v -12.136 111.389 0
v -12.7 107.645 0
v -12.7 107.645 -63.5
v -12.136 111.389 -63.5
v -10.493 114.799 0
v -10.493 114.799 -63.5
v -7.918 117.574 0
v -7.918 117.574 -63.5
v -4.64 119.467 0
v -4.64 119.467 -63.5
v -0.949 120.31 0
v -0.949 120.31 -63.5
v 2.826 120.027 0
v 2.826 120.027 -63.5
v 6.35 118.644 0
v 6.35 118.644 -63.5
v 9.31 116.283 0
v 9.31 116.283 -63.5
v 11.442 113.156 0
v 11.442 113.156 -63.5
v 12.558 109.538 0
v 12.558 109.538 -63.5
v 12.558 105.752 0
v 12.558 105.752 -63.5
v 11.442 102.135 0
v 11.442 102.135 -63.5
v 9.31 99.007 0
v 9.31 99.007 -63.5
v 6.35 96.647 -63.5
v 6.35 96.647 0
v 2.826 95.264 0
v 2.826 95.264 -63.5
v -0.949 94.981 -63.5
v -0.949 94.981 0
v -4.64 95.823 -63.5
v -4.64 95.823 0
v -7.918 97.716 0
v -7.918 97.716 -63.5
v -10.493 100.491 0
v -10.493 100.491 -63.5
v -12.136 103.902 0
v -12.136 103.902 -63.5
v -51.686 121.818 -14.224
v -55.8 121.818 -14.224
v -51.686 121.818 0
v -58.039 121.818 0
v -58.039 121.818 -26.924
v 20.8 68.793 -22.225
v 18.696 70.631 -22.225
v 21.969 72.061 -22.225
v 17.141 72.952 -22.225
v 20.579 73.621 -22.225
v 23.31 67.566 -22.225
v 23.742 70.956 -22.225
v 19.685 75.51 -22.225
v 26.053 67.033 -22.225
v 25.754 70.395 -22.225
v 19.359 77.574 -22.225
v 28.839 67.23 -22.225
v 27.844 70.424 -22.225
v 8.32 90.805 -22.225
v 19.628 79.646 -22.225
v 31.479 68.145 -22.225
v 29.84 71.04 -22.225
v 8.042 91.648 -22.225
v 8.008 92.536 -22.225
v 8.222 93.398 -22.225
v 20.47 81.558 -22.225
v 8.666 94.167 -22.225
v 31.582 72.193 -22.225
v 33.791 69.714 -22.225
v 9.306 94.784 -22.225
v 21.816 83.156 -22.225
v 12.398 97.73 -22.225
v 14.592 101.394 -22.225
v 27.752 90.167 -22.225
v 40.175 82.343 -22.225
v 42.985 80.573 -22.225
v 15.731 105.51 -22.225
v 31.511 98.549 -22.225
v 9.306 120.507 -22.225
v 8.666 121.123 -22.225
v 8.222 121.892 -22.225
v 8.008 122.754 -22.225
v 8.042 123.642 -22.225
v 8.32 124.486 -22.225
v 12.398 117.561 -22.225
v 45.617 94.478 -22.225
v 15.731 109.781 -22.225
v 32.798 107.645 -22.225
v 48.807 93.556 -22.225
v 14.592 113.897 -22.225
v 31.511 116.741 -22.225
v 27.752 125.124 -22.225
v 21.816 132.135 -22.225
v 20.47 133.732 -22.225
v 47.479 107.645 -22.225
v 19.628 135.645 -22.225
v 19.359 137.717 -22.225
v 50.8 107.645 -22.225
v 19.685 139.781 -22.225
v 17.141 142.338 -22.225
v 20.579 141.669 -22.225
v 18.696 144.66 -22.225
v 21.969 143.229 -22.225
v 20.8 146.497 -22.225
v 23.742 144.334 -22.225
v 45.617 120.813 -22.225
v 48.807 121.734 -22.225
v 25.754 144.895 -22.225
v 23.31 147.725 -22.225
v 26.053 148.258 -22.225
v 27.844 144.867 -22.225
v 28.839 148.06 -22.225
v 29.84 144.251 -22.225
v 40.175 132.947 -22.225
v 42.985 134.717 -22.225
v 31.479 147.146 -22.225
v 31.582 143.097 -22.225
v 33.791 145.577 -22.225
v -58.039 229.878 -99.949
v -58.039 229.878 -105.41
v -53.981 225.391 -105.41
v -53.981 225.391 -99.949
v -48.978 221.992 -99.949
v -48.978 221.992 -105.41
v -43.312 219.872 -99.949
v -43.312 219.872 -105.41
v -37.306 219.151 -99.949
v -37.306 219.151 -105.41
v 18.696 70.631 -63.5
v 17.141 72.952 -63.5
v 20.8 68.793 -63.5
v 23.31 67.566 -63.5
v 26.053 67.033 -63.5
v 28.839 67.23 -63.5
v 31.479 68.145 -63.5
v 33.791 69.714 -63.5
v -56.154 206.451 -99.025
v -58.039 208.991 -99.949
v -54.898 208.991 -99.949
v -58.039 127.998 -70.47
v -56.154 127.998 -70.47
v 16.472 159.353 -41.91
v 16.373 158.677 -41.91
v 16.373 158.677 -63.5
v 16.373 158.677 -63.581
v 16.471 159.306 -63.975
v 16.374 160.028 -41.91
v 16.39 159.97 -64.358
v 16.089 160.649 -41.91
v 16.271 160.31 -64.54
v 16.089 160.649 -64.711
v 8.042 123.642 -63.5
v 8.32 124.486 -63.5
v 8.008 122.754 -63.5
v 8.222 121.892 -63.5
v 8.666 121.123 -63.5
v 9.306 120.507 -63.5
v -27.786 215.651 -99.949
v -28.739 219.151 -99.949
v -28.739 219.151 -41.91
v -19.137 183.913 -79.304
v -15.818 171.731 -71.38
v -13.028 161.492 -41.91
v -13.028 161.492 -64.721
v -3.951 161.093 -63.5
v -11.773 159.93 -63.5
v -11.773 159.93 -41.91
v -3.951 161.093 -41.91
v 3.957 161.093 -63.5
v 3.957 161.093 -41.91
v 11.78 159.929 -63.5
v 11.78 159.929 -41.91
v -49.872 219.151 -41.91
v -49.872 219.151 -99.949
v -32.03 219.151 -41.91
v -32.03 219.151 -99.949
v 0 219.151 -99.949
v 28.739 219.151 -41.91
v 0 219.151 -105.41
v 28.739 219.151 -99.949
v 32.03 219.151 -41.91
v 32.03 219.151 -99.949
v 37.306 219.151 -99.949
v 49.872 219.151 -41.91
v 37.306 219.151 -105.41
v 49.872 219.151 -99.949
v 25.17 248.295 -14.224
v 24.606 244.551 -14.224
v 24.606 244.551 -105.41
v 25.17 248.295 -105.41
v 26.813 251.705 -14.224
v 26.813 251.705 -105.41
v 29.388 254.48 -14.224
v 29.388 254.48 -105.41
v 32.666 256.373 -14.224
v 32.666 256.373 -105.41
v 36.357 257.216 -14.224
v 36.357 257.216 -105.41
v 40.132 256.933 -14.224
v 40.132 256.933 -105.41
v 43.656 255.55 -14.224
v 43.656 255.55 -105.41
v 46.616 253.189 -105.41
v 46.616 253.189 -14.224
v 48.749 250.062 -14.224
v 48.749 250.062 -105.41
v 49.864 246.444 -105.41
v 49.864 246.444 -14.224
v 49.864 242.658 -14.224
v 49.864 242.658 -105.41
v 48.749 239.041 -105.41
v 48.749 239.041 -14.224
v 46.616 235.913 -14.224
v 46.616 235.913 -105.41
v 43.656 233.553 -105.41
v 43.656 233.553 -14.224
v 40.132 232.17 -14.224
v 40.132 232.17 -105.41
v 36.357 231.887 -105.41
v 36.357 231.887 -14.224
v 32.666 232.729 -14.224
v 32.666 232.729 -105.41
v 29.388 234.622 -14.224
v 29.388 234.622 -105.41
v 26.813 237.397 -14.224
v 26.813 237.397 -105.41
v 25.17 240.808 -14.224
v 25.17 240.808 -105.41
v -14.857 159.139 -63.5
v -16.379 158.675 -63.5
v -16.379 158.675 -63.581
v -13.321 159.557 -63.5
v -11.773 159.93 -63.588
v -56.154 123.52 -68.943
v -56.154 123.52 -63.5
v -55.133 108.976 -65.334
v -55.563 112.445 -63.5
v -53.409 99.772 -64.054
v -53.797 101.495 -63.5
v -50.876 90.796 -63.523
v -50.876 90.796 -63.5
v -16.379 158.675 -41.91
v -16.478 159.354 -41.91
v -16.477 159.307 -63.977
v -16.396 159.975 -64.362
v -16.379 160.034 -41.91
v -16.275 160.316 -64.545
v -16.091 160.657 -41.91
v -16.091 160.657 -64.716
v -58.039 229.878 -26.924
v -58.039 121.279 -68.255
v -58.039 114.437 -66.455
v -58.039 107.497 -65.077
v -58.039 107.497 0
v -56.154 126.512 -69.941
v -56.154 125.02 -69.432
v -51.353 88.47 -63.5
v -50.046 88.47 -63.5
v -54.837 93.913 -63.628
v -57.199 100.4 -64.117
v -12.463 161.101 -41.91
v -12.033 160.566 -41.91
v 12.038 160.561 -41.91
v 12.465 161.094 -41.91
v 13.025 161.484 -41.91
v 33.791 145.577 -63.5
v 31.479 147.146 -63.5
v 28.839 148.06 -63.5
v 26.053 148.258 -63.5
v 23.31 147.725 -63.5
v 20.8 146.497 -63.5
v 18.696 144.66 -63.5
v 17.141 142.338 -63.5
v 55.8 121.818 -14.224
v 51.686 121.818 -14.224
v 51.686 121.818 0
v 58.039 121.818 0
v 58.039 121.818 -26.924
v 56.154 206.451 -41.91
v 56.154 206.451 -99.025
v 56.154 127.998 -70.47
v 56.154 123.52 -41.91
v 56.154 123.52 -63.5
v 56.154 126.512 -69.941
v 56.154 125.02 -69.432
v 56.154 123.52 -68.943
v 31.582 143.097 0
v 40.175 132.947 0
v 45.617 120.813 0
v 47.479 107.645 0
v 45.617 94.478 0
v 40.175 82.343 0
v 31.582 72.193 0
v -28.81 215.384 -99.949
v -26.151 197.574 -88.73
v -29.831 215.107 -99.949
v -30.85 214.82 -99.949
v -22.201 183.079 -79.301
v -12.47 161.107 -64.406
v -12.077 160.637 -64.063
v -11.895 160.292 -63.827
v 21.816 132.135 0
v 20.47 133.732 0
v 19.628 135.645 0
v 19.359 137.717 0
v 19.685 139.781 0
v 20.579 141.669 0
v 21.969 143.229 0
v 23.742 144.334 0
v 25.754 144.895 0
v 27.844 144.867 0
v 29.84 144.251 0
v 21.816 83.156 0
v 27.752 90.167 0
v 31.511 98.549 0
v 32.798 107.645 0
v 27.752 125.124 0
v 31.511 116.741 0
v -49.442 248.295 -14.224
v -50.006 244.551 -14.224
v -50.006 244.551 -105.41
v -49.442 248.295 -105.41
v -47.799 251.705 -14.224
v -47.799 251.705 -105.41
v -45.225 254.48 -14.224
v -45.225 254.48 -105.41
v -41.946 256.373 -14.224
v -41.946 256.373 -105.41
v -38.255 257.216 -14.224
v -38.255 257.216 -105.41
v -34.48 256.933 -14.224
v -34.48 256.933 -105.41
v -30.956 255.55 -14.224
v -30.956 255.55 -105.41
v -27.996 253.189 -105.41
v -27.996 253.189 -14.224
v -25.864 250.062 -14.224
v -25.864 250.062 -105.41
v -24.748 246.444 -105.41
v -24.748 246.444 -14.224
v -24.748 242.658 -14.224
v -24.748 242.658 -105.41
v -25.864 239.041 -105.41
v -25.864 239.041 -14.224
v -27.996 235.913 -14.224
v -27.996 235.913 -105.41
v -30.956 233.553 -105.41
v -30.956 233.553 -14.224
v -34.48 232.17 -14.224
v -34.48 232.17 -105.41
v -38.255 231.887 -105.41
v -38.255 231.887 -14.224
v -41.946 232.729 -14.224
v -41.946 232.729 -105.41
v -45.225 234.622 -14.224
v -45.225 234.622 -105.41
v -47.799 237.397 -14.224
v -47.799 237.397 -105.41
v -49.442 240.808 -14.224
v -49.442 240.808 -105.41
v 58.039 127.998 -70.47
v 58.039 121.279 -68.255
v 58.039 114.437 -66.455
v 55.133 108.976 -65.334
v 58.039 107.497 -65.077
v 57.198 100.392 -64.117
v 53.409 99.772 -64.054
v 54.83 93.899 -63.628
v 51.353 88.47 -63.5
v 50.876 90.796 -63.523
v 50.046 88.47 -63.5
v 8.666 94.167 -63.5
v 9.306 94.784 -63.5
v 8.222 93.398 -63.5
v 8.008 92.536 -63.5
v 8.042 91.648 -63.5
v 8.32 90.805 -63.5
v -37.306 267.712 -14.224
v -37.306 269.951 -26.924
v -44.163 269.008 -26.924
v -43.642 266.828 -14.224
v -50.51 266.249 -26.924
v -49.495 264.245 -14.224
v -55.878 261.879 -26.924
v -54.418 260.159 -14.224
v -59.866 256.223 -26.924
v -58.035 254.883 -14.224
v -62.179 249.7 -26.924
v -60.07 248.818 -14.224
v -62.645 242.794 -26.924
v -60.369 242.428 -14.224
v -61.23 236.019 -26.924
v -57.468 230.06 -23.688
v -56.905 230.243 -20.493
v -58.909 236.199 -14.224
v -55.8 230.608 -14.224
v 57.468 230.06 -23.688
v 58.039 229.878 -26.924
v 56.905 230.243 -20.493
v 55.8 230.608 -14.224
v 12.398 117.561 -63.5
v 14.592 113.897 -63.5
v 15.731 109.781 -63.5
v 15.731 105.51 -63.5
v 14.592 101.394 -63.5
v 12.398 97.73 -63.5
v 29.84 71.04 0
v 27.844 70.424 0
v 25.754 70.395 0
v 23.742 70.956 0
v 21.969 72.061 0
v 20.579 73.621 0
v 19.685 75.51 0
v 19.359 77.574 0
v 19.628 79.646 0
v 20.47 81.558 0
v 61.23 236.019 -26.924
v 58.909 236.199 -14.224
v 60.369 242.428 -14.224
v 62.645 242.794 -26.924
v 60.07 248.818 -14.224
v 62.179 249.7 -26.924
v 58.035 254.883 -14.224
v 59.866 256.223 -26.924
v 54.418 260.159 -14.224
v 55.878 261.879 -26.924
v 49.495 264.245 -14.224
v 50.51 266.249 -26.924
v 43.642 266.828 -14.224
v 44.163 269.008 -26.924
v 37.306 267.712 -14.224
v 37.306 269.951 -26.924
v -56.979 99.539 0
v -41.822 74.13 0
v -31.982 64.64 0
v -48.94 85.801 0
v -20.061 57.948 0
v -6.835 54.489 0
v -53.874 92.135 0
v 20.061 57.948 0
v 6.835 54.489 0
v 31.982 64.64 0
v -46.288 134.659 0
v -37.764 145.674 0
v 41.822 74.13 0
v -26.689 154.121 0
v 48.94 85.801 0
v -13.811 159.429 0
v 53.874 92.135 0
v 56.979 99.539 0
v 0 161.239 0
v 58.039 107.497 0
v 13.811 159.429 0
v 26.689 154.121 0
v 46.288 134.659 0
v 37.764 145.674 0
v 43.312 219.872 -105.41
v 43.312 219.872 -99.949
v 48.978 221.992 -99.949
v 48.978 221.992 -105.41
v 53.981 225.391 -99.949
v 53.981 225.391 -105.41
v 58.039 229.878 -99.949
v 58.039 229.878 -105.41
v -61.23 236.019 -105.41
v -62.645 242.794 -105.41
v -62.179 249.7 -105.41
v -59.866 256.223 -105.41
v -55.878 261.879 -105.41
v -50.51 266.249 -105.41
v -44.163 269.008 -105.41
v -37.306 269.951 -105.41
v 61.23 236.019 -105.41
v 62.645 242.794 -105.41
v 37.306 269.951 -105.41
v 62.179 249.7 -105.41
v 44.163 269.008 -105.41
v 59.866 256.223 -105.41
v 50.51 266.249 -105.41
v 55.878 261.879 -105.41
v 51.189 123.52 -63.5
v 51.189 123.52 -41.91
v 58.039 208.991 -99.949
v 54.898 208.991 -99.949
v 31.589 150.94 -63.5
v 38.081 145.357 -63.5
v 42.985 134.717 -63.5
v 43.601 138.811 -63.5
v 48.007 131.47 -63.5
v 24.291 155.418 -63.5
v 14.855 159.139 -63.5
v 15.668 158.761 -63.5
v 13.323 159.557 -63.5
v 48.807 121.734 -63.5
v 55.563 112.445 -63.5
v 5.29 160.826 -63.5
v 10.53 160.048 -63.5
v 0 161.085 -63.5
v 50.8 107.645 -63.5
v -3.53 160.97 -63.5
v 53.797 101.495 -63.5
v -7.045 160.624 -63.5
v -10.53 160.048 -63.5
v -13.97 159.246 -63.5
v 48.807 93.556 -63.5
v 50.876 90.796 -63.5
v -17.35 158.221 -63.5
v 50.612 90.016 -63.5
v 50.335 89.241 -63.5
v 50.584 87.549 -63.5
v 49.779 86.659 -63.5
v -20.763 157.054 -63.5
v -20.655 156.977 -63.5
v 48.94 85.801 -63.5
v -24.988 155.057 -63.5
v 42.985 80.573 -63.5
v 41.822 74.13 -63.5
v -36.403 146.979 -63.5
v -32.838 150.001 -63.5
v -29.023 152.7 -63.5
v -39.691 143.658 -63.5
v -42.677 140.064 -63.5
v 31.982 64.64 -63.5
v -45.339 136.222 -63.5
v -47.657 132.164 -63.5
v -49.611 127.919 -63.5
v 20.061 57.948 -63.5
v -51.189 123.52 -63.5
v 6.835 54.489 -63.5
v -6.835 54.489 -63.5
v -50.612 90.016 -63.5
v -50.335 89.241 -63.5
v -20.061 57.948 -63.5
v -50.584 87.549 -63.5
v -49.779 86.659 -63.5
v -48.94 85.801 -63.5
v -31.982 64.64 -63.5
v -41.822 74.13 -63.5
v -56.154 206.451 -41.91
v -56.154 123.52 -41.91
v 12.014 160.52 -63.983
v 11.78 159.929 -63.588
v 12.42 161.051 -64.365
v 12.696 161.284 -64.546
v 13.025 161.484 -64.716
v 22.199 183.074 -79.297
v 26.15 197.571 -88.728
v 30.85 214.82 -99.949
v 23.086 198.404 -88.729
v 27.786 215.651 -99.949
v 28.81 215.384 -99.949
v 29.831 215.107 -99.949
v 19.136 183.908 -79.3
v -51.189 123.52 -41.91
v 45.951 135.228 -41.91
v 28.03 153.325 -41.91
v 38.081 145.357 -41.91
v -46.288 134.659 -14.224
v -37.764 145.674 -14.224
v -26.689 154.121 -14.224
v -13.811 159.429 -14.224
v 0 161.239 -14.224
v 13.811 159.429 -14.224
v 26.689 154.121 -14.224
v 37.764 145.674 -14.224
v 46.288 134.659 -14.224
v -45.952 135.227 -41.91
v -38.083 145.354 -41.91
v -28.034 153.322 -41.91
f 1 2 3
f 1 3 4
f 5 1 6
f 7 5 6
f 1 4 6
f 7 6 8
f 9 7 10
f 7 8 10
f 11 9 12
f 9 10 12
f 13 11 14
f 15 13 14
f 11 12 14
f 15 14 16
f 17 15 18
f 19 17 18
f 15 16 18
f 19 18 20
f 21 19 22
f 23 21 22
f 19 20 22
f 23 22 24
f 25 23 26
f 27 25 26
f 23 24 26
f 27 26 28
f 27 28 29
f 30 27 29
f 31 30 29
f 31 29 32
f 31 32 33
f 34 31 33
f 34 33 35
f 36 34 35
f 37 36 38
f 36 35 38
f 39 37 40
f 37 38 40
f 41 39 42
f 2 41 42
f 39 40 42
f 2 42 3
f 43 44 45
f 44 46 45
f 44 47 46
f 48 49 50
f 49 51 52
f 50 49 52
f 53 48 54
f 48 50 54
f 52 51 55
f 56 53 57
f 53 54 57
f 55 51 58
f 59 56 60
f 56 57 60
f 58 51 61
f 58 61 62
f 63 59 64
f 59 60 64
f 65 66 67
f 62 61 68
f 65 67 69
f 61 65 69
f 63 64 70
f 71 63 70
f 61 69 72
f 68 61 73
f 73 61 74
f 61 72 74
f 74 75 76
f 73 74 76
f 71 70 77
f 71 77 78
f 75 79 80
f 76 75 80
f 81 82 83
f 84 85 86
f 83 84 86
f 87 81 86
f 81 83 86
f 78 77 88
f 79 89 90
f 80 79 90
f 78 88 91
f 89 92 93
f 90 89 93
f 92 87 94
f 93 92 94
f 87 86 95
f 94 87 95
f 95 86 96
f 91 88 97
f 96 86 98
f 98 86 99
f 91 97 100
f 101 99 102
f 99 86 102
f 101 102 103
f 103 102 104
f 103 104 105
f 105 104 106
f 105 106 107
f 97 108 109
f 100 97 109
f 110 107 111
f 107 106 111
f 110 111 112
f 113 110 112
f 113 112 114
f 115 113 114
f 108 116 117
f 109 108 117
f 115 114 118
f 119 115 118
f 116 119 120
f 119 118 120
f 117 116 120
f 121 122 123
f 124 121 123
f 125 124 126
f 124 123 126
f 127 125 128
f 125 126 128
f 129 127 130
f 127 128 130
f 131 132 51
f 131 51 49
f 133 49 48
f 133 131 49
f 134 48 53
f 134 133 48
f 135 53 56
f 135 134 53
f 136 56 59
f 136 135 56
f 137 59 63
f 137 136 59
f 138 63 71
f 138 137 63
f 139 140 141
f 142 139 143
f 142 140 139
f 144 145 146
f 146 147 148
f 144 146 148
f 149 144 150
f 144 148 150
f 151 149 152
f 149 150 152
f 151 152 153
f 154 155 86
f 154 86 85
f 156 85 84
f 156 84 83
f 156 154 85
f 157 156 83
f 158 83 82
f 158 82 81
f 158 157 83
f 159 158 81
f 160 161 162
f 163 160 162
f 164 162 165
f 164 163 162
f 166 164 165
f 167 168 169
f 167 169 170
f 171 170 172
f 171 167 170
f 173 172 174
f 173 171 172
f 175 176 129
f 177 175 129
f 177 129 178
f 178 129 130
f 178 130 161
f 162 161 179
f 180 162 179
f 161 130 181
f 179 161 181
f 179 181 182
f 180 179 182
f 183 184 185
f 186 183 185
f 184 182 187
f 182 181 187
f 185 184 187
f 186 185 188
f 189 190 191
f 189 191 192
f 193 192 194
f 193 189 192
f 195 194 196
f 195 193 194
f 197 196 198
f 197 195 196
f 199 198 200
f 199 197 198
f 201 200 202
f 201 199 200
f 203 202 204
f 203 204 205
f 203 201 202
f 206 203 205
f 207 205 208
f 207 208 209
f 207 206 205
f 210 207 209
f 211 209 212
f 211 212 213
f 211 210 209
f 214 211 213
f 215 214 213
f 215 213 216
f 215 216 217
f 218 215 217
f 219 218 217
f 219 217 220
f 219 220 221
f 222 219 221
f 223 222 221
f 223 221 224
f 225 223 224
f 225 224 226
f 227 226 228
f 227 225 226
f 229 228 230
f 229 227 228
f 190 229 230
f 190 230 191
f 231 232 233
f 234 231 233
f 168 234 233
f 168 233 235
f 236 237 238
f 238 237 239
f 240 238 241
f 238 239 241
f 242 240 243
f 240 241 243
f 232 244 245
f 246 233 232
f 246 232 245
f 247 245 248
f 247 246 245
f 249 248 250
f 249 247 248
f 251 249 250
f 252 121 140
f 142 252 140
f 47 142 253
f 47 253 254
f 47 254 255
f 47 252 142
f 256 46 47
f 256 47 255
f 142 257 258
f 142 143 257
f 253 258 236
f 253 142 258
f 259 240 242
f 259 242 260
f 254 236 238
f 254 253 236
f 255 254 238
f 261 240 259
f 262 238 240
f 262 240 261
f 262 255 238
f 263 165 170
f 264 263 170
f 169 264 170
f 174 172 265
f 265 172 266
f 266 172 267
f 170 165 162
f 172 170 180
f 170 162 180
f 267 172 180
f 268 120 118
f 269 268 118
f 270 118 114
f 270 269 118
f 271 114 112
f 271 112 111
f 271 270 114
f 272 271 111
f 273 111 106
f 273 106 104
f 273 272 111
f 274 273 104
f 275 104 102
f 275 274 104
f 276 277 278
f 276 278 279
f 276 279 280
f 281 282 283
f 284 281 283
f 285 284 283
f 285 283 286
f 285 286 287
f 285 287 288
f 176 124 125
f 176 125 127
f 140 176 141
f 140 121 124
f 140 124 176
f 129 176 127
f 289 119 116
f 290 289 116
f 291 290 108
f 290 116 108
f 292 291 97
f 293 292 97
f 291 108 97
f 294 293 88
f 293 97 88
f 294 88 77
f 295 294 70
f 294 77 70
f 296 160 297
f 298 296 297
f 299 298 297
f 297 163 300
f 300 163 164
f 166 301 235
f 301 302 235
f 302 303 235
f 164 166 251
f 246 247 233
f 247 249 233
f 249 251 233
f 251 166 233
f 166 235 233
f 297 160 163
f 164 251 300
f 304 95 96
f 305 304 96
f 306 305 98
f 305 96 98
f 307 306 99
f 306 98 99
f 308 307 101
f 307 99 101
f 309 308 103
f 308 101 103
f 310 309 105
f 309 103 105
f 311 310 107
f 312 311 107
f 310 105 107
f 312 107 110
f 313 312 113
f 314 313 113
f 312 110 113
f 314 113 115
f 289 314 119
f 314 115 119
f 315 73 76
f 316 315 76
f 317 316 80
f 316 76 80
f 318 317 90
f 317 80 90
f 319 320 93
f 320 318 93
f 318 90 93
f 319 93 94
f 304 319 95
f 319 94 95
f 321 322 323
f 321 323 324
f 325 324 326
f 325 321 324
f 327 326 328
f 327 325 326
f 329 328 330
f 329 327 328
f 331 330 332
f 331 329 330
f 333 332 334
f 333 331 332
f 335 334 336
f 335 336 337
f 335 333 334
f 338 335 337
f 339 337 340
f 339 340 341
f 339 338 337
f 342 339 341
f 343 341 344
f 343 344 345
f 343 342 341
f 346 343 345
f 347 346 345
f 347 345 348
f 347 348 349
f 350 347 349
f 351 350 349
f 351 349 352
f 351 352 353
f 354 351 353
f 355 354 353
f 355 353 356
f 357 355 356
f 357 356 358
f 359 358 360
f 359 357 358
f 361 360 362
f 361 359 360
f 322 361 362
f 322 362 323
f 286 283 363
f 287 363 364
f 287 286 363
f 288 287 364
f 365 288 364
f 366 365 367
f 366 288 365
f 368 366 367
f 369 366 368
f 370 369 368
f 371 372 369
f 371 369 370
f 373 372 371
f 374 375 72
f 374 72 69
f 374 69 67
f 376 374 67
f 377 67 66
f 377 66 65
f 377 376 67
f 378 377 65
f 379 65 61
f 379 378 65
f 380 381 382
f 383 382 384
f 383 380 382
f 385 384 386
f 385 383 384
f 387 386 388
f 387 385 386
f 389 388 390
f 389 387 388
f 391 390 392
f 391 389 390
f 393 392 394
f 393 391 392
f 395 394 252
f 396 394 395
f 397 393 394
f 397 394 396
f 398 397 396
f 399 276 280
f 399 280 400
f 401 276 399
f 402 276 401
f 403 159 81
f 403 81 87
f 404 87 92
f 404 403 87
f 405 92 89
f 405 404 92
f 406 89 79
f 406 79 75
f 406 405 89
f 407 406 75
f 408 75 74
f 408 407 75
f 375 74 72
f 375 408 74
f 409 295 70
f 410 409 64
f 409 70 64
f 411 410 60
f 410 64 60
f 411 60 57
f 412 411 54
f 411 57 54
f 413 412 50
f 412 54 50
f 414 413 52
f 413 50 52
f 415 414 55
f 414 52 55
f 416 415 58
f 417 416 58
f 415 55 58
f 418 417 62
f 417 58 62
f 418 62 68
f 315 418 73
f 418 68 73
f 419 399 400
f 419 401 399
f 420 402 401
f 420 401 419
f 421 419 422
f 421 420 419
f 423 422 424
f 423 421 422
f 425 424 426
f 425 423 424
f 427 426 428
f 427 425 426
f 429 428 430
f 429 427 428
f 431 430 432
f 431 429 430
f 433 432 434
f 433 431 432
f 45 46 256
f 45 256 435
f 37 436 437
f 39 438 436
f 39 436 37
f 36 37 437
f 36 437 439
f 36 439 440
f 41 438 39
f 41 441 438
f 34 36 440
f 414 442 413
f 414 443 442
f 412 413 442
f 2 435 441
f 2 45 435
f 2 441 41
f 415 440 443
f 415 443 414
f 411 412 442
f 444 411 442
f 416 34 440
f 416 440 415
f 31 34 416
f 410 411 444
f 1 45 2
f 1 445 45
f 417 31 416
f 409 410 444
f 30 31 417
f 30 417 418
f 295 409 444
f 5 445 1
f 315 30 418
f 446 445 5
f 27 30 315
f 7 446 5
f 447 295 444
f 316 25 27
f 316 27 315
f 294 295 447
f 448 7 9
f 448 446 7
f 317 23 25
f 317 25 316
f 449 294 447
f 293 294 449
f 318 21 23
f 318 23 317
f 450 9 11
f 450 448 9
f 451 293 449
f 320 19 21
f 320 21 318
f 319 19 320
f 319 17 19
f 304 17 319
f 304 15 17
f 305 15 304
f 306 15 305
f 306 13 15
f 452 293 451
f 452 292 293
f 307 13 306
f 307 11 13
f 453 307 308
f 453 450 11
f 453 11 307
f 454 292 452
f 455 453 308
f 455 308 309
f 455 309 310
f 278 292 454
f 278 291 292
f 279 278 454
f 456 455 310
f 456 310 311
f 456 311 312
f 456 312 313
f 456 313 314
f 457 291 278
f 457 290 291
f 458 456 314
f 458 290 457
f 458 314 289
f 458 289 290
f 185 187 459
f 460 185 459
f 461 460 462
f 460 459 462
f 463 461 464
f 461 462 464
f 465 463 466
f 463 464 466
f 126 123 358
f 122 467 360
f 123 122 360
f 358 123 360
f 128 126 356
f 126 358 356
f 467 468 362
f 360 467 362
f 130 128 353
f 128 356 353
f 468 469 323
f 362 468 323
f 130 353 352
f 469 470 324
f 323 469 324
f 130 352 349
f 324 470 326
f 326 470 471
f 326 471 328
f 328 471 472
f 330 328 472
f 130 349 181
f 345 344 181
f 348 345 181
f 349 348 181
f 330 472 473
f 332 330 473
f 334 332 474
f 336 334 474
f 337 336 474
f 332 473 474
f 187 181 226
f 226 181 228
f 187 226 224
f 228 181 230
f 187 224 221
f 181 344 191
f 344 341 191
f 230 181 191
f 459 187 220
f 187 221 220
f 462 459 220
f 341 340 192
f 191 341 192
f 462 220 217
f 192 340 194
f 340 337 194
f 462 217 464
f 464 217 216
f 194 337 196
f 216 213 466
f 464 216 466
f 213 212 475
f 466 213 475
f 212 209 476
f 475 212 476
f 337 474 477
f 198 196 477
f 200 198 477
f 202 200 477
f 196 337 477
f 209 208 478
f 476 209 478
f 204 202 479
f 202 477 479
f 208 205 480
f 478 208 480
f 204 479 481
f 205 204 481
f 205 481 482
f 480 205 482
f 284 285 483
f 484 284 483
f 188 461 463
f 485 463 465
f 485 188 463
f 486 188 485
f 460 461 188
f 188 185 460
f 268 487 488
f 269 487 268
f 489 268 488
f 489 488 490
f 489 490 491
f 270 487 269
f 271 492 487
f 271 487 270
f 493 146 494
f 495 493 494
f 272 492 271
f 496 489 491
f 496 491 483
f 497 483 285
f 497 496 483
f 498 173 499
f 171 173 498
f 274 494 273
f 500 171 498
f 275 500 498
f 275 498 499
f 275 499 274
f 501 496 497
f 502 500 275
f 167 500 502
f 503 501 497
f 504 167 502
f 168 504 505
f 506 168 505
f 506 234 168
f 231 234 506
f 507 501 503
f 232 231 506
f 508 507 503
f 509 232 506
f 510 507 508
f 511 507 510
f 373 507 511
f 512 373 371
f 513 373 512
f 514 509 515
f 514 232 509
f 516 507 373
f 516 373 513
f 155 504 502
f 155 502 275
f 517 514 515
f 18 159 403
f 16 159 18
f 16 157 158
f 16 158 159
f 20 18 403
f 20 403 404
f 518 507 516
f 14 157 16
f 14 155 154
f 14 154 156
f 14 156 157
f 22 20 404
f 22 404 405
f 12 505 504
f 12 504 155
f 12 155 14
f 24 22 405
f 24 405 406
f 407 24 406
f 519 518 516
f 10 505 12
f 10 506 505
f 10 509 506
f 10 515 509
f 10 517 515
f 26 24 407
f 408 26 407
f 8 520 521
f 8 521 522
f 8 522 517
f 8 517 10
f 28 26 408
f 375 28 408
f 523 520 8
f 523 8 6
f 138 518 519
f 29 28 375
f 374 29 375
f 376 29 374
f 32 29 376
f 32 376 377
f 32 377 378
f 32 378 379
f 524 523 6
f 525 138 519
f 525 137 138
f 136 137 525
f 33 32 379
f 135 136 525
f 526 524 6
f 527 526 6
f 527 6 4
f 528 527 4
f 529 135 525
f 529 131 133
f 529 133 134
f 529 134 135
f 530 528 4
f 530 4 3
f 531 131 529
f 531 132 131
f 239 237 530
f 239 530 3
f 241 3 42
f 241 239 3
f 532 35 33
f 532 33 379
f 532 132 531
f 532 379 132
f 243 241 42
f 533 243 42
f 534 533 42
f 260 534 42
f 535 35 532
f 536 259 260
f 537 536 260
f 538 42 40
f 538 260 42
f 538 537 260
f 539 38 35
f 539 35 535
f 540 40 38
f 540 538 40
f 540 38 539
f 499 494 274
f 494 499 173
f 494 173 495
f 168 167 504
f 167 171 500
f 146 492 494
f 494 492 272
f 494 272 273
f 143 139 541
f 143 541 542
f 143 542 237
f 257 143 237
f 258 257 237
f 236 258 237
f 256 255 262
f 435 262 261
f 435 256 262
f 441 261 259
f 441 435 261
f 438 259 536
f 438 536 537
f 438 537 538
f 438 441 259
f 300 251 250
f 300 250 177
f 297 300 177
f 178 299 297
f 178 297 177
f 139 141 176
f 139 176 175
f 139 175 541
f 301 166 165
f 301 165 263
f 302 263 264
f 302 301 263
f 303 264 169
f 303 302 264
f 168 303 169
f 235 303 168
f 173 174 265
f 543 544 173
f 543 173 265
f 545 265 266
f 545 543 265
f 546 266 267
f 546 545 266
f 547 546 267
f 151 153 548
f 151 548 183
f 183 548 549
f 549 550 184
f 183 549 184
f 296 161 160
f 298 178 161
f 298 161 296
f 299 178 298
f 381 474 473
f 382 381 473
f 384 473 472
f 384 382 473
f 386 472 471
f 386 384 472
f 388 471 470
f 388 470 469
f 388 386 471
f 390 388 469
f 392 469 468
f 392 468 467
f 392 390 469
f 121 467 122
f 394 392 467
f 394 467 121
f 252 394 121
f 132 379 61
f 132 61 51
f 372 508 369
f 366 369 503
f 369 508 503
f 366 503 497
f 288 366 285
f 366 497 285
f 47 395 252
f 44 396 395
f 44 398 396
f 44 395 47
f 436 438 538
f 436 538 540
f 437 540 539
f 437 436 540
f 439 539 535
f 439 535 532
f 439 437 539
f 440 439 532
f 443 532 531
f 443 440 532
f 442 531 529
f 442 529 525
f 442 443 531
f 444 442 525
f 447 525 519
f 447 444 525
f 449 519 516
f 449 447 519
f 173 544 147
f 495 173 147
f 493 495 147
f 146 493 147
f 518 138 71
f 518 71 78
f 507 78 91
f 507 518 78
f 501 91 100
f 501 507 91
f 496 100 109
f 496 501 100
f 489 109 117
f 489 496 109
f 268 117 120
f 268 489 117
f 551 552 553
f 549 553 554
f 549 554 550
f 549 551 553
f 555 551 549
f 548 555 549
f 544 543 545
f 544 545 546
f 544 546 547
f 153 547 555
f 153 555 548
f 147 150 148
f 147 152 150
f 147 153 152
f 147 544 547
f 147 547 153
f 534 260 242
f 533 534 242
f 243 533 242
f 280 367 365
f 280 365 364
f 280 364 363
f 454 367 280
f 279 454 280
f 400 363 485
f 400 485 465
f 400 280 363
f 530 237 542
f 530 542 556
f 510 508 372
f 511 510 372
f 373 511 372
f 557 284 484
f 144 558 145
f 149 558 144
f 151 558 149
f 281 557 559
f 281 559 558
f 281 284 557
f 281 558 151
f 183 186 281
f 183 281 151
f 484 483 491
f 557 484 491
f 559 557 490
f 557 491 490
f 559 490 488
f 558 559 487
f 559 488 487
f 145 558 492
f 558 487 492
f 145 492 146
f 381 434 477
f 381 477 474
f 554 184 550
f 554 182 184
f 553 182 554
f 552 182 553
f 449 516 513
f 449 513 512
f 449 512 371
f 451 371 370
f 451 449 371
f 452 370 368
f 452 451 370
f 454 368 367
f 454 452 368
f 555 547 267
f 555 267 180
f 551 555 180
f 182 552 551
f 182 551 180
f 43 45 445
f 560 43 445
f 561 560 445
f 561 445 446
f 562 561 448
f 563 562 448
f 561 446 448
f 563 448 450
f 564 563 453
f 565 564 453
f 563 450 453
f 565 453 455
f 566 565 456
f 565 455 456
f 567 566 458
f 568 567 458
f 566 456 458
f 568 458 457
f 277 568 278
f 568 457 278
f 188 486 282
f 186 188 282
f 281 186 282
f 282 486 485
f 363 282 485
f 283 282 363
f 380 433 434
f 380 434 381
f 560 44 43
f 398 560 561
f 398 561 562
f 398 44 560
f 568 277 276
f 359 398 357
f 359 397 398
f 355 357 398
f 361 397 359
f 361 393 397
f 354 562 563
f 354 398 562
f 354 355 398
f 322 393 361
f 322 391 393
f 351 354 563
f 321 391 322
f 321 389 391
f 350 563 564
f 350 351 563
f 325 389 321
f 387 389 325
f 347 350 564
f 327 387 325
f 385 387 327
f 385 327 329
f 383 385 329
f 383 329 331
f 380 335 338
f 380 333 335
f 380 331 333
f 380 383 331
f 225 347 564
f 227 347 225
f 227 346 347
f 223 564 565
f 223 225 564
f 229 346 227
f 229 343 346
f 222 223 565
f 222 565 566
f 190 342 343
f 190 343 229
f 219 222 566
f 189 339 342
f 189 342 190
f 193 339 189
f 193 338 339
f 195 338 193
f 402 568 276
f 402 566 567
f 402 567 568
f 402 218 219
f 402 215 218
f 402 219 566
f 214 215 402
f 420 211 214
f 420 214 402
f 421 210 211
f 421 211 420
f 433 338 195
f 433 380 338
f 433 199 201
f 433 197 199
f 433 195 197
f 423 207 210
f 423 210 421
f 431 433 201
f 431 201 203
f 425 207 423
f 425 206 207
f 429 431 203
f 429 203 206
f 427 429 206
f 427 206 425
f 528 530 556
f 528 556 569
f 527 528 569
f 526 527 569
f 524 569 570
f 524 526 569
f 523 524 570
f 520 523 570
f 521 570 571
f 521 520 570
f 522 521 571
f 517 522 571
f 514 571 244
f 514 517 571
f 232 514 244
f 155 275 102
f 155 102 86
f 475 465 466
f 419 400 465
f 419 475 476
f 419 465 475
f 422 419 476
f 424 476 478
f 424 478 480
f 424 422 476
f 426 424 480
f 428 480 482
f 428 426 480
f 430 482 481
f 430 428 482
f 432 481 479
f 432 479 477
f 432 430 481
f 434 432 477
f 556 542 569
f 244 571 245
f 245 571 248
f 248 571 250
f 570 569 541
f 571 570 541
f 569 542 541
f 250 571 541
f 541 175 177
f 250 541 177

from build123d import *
from OCP.BRepFilletAPI import BRepFilletAPI_MakeChamfer

# Parameters (mm, degrees)
SKETCH39_R               = 12.7
BOSS_EXTRUDE16_DEPTH     = 105.41
CUT_EXTRUDE13_DEPTH      = 297.507996976
CUT_EXTRUDE13_DEPTH_BACK = 297.507996976
SKETCH41_R               = 12.7
BOSS_EXTRUDE17_DEPTH     = 5.461
SKETCH42_R               = 53.594
CUT_EXTRUDE14_DEPTH      = 41.91
SKETCH43_R               = 12.7
CUT_EXTRUDE15_DEPTH      = 41.275
CUT_EXTRUDE25_DEPTH      = 14.224
CHAMFER1_SIZE            = 12.7
CHAMFER1_SIZE2           = 2.239352655
CUT_EXTRUDE18_DEPTH      = 63.5
CUT_REVOLVE4_ANGLE       = 45
CUT_EXTRUDE22_REACH      = 286.32
SKETCH53_R               = 12.7
CUT_EXTRUDE23_DEPTH      = 285.32019658
CUT_EXTRUDE24_DEPTH      = 290.353535308


with BuildPart() as part:
    # Sketch39 → Boss-Extrude16 (new body)
    with BuildSketch(Plane(origin=(0, 0, 0), x_dir=(-1, 0, 0), z_dir=(0, 0, -1))):
        with BuildLine():
            Line((-37.30625, 269.9512), (37.30625, 269.9512))
            ThreePointArc((37.30625, 269.9512), (59.865817558, 256.222785651), (58.039, 229.877649733))
            Line((58.039, 229.877649733), (58.039, 107.49735517))
            ThreePointArc((58.039, 107.49735517), (55.67225609, 95.733970947), (48.940336125, 85.8012))
            ThreePointArc((48.940336125, 85.8012), (0, 54.0512), (-48.940336125, 85.8012))
            ThreePointArc((-48.940336125, 85.8012), (-55.67225609, 95.733970947), (-58.039, 107.49735517))
            Line((-58.039, 107.49735517), (-58.039, 229.877649733))
            ThreePointArc((-58.039, 229.877649733), (-59.865817558, 256.222785651), (-37.30625, 269.9512))
        make_face()
        with Locations((-37.30625, 244.5512)):
            Circle(SKETCH39_R, mode=Mode.SUBTRACT)
        with Locations((37.30625, 244.5512)):
            Circle(SKETCH39_R, mode=Mode.SUBTRACT)
    extrude(amount=BOSS_EXTRUDE16_DEPTH)

    # Sketch40 → Cut-Extrude13 (cut, two sides)
    with BuildSketch(Plane(origin=(0, 0, 0), x_dir=(0, 0, -1), z_dir=(1, 0, 0))) as cut_extrude13_sk:
        with BuildLine():
            Line((99.949, 208.9912), (70.469723816, 127.997554342))
            ThreePointArc((70.469723816, 127.997554342), (65.255767984, 108.538806271), (63.5, 88.470286378))
            Line((63.5, 88.470286378), (63.5, 54.0512))
            Line((63.5, 54.0512), (105.41, 54.0512))
            Line((105.41, 54.0512), (105.41, 229.877649733))
            Line((105.41, 229.877649733), (99.949, 229.877649733))
            Line((99.949, 229.877649733), (99.949, 208.9912))
        make_face()
    extrude(amount=CUT_EXTRUDE13_DEPTH, mode=Mode.SUBTRACT)
    extrude(cut_extrude13_sk.sketch, amount=-CUT_EXTRUDE13_DEPTH_BACK, mode=Mode.SUBTRACT)

    # Sketch41 → Boss-Extrude17 (add)
    with BuildSketch(Plane(origin=(0, 0, -105.41), x_dir=(-1, 0, 0), z_dir=(0, 0, -1))):
        with BuildLine():
            Line((-37.30625, 269.9512), (37.30625, 269.9512))
            ThreePointArc((37.30625, 269.9512), (62.70625, 244.5512), (37.30625, 219.1512))
            Line((37.30625, 219.1512), (-37.30625, 219.1512))
            ThreePointArc((-37.30625, 219.1512), (-62.70625, 244.5512), (-37.30625, 269.9512))
        make_face()
        with Locations((-37.30625, 244.5512)):
            Circle(SKETCH41_R, mode=Mode.SUBTRACT)
        with Locations((37.30625, 244.5512)):
            Circle(SKETCH41_R, mode=Mode.SUBTRACT)
    extrude(amount=-BOSS_EXTRUDE17_DEPTH)

    # Sketch42 → Cut-Extrude14 (cut)
    with BuildSketch(Plane(origin=(0, 0, -105.41), x_dir=(-1, 0, 0), z_dir=(0, 0, -1))):
        with Locations((0, 107.6452)):
            Circle(SKETCH42_R)
    extrude(amount=-CUT_EXTRUDE14_DEPTH, mode=Mode.SUBTRACT)

    # Sketch43 → Cut-Extrude15 (cut)
    with BuildSketch(Plane(origin=(0, 0, -63.5), x_dir=(-1, 0, 0), z_dir=(0, 0, -1))):
        with Locations((0, 107.6452)):
            Circle(SKETCH43_R)
        with BuildLine():
            Line((-17.140551152, 142.338453637), (-8.320140689, 124.485542452))
            ThreePointArc((-8.320140689, 124.485542452), (-8.084797468, 122.315875536), (-9.305565087, 120.50685166))
            ThreePointArc((-9.305565087, 120.50685166), (-15.875, 107.6452), (-9.305565087, 94.78354834))
            ThreePointArc((-9.305565087, 94.78354834), (-8.084797468, 92.974524464), (-8.320140689, 90.804857548))
            Line((-8.320140689, 90.804857548), (-17.140551152, 72.951946363))
            ThreePointArc((-17.140551152, 72.951946363), (-24.663775135, 67.208970871), (-33.791061651, 69.713628025))
            ThreePointArc((-33.791061651, 69.713628025), (-50.8, 107.6452), (-33.791061651, 145.576771975))
            ThreePointArc((-33.791061651, 145.576771975), (-24.663775135, 148.081429129), (-17.140551152, 142.338453637))
        make_face()
    extrude(amount=-CUT_EXTRUDE15_DEPTH, mode=Mode.SUBTRACT)

    # Sketch57 → Cut-Extrude25 (cut)
    with BuildSketch(Plane.XY):
        with BuildLine():
            Line((-58.039, 121.8184), (-51.685948165, 121.8184))
            ThreePointArc((-51.685948165, 121.8184), (0, 161.2392), (51.685948165, 121.8184))
            Line((51.685948165, 121.8184), (58.039, 121.8184))
            Line((58.039, 121.8184), (58.039, 229.877649733))
            ThreePointArc((58.039, 229.877649733), (59.865817558, 256.222785651), (37.30625, 269.9512))
            Line((37.30625, 269.9512), (-37.30625, 269.9512))
            ThreePointArc((-37.30625, 269.9512), (-59.865817558, 256.222785651), (-58.039, 229.877649733))
            Line((-58.039, 229.877649733), (-58.039, 121.8184))
        make_face()
    extrude(amount=-CUT_EXTRUDE25_DEPTH, mode=Mode.SUBTRACT)

    # Chamfer1: one chamfer whose edges measure the first distance from different faces: ONE call of the kernel's chamfer builder (chamfer() names one face for all edges)
    chamfer1_edges_1 = [part.edges().sort_by_distance(p)[0] for p in [
        (58.039, 175.848024867, -14.224),
    ]]
    chamfer1_side_1 = [part.faces().sort_by_distance(p)[0] for p in [
        (58.039, 173.156318685, -49.465514594),
    ]]
    chamfer1_edges_2 = [part.edges().sort_by_distance(p)[0] for p in [
        (-58.039, 175.848024867, -14.224),
    ]]
    chamfer1_side_2 = [part.faces().sort_by_distance(p)[0] for p in [
        (-58.039, 173.156318685, -49.465514594),
    ]]
    chamfer1_edges_3 = [part.edges().sort_by_distance(p)[0] for p in [
        (-59.865817558, 256.222785651, -14.224),
    ]]
    chamfer1_side_3 = [part.faces().sort_by_distance(p)[0] for p in [
        (-59.865817558, 256.222785651, -57.0865),
    ]]
    chamfer1_edges_4 = [part.edges().sort_by_distance(p)[0] for p in [
        (0, 269.9512, -14.224),
    ]]
    chamfer1_side_4 = [part.faces().sort_by_distance(p)[0] for p in [
        (0, 269.9512, -57.0865),
    ]]
    chamfer1_edges_5 = [part.edges().sort_by_distance(p)[0] for p in [
        (59.865817558, 256.222785651, -14.224),
    ]]
    chamfer1_side_5 = [part.faces().sort_by_distance(p)[0] for p in [
        (59.865817558, 256.222785651, -57.0865),
    ]]
    chamfer1 = BRepFilletAPI_MakeChamfer(part.part.solid().wrapped)
    for e in chamfer1_edges_1:
        chamfer1.Add(CHAMFER1_SIZE, CHAMFER1_SIZE2, e.wrapped, chamfer1_side_1[0].wrapped)  # the first distance lies on this face
    for e in chamfer1_edges_2:
        chamfer1.Add(CHAMFER1_SIZE, CHAMFER1_SIZE2, e.wrapped, chamfer1_side_2[0].wrapped)  # the first distance lies on this face
    for e in chamfer1_edges_3:
        chamfer1.Add(CHAMFER1_SIZE, CHAMFER1_SIZE2, e.wrapped, chamfer1_side_3[0].wrapped)  # the first distance lies on this face
    for e in chamfer1_edges_4:
        chamfer1.Add(CHAMFER1_SIZE, CHAMFER1_SIZE2, e.wrapped, chamfer1_side_4[0].wrapped)  # the first distance lies on this face
    for e in chamfer1_edges_5:
        chamfer1.Add(CHAMFER1_SIZE, CHAMFER1_SIZE2, e.wrapped, chamfer1_side_5[0].wrapped)  # the first distance lies on this face
    add(Compound.cast(chamfer1.Shape()), mode=Mode.REPLACE)

    # Sketch46 → Cut-Extrude18 (cut)
    with BuildSketch(Plane(origin=(0, 0, -105.41), x_dir=(-1, 0, 0), z_dir=(0, 0, -1))):
        with BuildLine():
            Line((-56.154391463, 206.4512), (-56.154391463, 123.5202))
            Line((-56.154391463, 123.5202), (-51.188877806, 123.5202))
            ThreePointArc((-51.188877806, 123.5202), (-38.080986117, 145.35667481), (-16.37335621, 158.676857257))
            ThreePointArc((-16.37335621, 158.676857257), (-16.447164367, 159.694072309), (-16.088636924, 160.64886662))
            Line((-16.088636924, 160.64886662), (-32.030251423, 219.1512))
            Line((-32.030251423, 219.1512), (-49.871677642, 219.1512))
            Line((-49.871677642, 219.1512), (-56.154391463, 206.4512))
        make_face()
        with BuildLine():
            Line((56.154391463, 206.4512), (56.154391463, 123.5202))
            Line((56.154391463, 123.5202), (51.188877806, 123.5202))
            ThreePointArc((51.188877806, 123.5202), (38.083220696, 145.354418203), (16.379403996, 158.674916448))
            ThreePointArc((16.379403996, 158.674916448), (16.453052349, 159.697717152), (16.090874379, 160.657077605))
            Line((16.090874379, 160.657077605), (32.030251423, 219.1512))
            Line((32.030251423, 219.1512), (49.871677642, 219.1512))
            Line((49.871677642, 219.1512), (56.154391463, 206.4512))
        make_face()
        with BuildLine():
            Line((28.739484198, 219.1512), (13.027568982, 161.491814117))
            ThreePointArc((13.027568982, 161.491814117), (12.22875634, 160.848818221), (11.773335802, 159.930048667))
            ThreePointArc((11.773335802, 159.930048667), (-0.003175786, 161.239199906), (-11.77953214, 159.928653009))
            ThreePointArc((-11.77953214, 159.928653009), (-12.231981249, 160.842690157), (-13.025331527, 161.483603132))
            Line((-13.025331527, 161.483603132), (-28.739484198, 219.1512))
            Line((-28.739484198, 219.1512), (28.739484198, 219.1512))
        make_face()
    extrude(amount=-CUT_EXTRUDE18_DEPTH, mode=Mode.SUBTRACT)

    # Sketch47 → Cut-Revolve4 (revolve, symmetric, cut)
    with BuildSketch(Plane(origin=(0, 0, 0), x_dir=(0, 0, -1), z_dir=(1, 0, 0))) as cut_revolve4_sk:
        Polygon((99.949, 219.1512), (63.5, 161.085477364), (105.41, 161.085477364), (105.41, 219.1512), align=None)
    revolve(axis=Axis((0, 107.110477364, -63.5), (0, 0, -1)), revolution_arc=CUT_REVOLVE4_ANGLE / 2, mode=Mode.SUBTRACT)
    revolve(cut_revolve4_sk.sketch, axis=Axis((0, 107.110477364, -63.5), (0, 0, 1)), revolution_arc=CUT_REVOLVE4_ANGLE / 2, mode=Mode.SUBTRACT)

    # Sketch52 → Cut-Extrude22 (cut, up to next)
    with BuildSketch(Plane(origin=(0, 0, -63.5), x_dir=(-1, 0, 0), z_dir=(0, 0, -1)), mode=Mode.PRIVATE) as cut_extrude22_sk1:
        with BuildLine():
            Line((-56.154391463, 123.5202), (-51.188877806, 123.5202))
            ThreePointArc((-51.188877806, 123.5202), (-53.59155752, 107.133537422), (-50.876442713, 90.795736718))
            ThreePointArc((-50.876442713, 90.795736718), (-54.826433246, 106.946521771), (-56.154391463, 123.5202))
        make_face()
    cut_extrude22_tool1 = extrude(cut_extrude22_sk1.sketch, amount=CUT_EXTRUDE22_REACH, mode=Mode.PRIVATE) & part.part
    # Sketch52 → Cut-Extrude22 (cut, up to next)
    with BuildSketch(Plane(origin=(0, 0, -63.5), x_dir=(-1, 0, 0), z_dir=(0, 0, -1)), mode=Mode.PRIVATE) as cut_extrude22_sk2:
        with BuildLine():
            Line((51.188877806, 123.5202), (56.154391463, 123.5202))
            ThreePointArc((56.154391463, 123.5202), (54.826433246, 106.946521771), (50.876442713, 90.795736718))
            ThreePointArc((50.876442713, 90.795736718), (53.59155752, 107.133537422), (51.188877806, 123.5202))
        make_face()
    cut_extrude22_tool2 = extrude(cut_extrude22_sk2.sketch, amount=CUT_EXTRUDE22_REACH, mode=Mode.PRIVATE) & part.part
    add(cut_extrude22_tool1.solids().sort_by_distance((54.141808, 115.249163, -63.5))[0], mode=Mode.SUBTRACT)
    add(cut_extrude22_tool2.solids().sort_by_distance((-54.141808, 115.249163, -63.5))[0], mode=Mode.SUBTRACT)

    # Sketch53 → Cut-Extrude23 (cut, through all)
    with BuildSketch(Plane(origin=(0, 0, -63.5), x_dir=(-1, 0, 0), z_dir=(0, 0, -1))):
        with Locations((0, 107.6452)):
            Circle(SKETCH53_R)
    extrude(amount=-CUT_EXTRUDE23_DEPTH, mode=Mode.SUBTRACT)

    # Sketch54 → Cut-Extrude24 (cut, through all)
    with BuildSketch(Plane(origin=(0, 0, -22.225), x_dir=(-1, 0, 0), z_dir=(0, 0, -1))):
        with BuildLine():
            ThreePointArc((-31.581997064, 143.09702472), (-47.47898919, 107.6452), (-31.581997064, 72.19337528))
            ThreePointArc((-31.581997064, 72.19337528), (-21.218076505, 72.791679022), (-21.816380247, 83.155599581))
            ThreePointArc((-21.816380247, 83.155599581), (-32.79778919, 107.6452), (-21.816380247, 132.134800419))
            ThreePointArc((-21.816380247, 132.134800419), (-21.218076505, 142.498720978), (-31.581997064, 143.09702472))
        make_face()
    extrude(amount=-CUT_EXTRUDE24_DEPTH, mode=Mode.SUBTRACT)


solid = part.part
